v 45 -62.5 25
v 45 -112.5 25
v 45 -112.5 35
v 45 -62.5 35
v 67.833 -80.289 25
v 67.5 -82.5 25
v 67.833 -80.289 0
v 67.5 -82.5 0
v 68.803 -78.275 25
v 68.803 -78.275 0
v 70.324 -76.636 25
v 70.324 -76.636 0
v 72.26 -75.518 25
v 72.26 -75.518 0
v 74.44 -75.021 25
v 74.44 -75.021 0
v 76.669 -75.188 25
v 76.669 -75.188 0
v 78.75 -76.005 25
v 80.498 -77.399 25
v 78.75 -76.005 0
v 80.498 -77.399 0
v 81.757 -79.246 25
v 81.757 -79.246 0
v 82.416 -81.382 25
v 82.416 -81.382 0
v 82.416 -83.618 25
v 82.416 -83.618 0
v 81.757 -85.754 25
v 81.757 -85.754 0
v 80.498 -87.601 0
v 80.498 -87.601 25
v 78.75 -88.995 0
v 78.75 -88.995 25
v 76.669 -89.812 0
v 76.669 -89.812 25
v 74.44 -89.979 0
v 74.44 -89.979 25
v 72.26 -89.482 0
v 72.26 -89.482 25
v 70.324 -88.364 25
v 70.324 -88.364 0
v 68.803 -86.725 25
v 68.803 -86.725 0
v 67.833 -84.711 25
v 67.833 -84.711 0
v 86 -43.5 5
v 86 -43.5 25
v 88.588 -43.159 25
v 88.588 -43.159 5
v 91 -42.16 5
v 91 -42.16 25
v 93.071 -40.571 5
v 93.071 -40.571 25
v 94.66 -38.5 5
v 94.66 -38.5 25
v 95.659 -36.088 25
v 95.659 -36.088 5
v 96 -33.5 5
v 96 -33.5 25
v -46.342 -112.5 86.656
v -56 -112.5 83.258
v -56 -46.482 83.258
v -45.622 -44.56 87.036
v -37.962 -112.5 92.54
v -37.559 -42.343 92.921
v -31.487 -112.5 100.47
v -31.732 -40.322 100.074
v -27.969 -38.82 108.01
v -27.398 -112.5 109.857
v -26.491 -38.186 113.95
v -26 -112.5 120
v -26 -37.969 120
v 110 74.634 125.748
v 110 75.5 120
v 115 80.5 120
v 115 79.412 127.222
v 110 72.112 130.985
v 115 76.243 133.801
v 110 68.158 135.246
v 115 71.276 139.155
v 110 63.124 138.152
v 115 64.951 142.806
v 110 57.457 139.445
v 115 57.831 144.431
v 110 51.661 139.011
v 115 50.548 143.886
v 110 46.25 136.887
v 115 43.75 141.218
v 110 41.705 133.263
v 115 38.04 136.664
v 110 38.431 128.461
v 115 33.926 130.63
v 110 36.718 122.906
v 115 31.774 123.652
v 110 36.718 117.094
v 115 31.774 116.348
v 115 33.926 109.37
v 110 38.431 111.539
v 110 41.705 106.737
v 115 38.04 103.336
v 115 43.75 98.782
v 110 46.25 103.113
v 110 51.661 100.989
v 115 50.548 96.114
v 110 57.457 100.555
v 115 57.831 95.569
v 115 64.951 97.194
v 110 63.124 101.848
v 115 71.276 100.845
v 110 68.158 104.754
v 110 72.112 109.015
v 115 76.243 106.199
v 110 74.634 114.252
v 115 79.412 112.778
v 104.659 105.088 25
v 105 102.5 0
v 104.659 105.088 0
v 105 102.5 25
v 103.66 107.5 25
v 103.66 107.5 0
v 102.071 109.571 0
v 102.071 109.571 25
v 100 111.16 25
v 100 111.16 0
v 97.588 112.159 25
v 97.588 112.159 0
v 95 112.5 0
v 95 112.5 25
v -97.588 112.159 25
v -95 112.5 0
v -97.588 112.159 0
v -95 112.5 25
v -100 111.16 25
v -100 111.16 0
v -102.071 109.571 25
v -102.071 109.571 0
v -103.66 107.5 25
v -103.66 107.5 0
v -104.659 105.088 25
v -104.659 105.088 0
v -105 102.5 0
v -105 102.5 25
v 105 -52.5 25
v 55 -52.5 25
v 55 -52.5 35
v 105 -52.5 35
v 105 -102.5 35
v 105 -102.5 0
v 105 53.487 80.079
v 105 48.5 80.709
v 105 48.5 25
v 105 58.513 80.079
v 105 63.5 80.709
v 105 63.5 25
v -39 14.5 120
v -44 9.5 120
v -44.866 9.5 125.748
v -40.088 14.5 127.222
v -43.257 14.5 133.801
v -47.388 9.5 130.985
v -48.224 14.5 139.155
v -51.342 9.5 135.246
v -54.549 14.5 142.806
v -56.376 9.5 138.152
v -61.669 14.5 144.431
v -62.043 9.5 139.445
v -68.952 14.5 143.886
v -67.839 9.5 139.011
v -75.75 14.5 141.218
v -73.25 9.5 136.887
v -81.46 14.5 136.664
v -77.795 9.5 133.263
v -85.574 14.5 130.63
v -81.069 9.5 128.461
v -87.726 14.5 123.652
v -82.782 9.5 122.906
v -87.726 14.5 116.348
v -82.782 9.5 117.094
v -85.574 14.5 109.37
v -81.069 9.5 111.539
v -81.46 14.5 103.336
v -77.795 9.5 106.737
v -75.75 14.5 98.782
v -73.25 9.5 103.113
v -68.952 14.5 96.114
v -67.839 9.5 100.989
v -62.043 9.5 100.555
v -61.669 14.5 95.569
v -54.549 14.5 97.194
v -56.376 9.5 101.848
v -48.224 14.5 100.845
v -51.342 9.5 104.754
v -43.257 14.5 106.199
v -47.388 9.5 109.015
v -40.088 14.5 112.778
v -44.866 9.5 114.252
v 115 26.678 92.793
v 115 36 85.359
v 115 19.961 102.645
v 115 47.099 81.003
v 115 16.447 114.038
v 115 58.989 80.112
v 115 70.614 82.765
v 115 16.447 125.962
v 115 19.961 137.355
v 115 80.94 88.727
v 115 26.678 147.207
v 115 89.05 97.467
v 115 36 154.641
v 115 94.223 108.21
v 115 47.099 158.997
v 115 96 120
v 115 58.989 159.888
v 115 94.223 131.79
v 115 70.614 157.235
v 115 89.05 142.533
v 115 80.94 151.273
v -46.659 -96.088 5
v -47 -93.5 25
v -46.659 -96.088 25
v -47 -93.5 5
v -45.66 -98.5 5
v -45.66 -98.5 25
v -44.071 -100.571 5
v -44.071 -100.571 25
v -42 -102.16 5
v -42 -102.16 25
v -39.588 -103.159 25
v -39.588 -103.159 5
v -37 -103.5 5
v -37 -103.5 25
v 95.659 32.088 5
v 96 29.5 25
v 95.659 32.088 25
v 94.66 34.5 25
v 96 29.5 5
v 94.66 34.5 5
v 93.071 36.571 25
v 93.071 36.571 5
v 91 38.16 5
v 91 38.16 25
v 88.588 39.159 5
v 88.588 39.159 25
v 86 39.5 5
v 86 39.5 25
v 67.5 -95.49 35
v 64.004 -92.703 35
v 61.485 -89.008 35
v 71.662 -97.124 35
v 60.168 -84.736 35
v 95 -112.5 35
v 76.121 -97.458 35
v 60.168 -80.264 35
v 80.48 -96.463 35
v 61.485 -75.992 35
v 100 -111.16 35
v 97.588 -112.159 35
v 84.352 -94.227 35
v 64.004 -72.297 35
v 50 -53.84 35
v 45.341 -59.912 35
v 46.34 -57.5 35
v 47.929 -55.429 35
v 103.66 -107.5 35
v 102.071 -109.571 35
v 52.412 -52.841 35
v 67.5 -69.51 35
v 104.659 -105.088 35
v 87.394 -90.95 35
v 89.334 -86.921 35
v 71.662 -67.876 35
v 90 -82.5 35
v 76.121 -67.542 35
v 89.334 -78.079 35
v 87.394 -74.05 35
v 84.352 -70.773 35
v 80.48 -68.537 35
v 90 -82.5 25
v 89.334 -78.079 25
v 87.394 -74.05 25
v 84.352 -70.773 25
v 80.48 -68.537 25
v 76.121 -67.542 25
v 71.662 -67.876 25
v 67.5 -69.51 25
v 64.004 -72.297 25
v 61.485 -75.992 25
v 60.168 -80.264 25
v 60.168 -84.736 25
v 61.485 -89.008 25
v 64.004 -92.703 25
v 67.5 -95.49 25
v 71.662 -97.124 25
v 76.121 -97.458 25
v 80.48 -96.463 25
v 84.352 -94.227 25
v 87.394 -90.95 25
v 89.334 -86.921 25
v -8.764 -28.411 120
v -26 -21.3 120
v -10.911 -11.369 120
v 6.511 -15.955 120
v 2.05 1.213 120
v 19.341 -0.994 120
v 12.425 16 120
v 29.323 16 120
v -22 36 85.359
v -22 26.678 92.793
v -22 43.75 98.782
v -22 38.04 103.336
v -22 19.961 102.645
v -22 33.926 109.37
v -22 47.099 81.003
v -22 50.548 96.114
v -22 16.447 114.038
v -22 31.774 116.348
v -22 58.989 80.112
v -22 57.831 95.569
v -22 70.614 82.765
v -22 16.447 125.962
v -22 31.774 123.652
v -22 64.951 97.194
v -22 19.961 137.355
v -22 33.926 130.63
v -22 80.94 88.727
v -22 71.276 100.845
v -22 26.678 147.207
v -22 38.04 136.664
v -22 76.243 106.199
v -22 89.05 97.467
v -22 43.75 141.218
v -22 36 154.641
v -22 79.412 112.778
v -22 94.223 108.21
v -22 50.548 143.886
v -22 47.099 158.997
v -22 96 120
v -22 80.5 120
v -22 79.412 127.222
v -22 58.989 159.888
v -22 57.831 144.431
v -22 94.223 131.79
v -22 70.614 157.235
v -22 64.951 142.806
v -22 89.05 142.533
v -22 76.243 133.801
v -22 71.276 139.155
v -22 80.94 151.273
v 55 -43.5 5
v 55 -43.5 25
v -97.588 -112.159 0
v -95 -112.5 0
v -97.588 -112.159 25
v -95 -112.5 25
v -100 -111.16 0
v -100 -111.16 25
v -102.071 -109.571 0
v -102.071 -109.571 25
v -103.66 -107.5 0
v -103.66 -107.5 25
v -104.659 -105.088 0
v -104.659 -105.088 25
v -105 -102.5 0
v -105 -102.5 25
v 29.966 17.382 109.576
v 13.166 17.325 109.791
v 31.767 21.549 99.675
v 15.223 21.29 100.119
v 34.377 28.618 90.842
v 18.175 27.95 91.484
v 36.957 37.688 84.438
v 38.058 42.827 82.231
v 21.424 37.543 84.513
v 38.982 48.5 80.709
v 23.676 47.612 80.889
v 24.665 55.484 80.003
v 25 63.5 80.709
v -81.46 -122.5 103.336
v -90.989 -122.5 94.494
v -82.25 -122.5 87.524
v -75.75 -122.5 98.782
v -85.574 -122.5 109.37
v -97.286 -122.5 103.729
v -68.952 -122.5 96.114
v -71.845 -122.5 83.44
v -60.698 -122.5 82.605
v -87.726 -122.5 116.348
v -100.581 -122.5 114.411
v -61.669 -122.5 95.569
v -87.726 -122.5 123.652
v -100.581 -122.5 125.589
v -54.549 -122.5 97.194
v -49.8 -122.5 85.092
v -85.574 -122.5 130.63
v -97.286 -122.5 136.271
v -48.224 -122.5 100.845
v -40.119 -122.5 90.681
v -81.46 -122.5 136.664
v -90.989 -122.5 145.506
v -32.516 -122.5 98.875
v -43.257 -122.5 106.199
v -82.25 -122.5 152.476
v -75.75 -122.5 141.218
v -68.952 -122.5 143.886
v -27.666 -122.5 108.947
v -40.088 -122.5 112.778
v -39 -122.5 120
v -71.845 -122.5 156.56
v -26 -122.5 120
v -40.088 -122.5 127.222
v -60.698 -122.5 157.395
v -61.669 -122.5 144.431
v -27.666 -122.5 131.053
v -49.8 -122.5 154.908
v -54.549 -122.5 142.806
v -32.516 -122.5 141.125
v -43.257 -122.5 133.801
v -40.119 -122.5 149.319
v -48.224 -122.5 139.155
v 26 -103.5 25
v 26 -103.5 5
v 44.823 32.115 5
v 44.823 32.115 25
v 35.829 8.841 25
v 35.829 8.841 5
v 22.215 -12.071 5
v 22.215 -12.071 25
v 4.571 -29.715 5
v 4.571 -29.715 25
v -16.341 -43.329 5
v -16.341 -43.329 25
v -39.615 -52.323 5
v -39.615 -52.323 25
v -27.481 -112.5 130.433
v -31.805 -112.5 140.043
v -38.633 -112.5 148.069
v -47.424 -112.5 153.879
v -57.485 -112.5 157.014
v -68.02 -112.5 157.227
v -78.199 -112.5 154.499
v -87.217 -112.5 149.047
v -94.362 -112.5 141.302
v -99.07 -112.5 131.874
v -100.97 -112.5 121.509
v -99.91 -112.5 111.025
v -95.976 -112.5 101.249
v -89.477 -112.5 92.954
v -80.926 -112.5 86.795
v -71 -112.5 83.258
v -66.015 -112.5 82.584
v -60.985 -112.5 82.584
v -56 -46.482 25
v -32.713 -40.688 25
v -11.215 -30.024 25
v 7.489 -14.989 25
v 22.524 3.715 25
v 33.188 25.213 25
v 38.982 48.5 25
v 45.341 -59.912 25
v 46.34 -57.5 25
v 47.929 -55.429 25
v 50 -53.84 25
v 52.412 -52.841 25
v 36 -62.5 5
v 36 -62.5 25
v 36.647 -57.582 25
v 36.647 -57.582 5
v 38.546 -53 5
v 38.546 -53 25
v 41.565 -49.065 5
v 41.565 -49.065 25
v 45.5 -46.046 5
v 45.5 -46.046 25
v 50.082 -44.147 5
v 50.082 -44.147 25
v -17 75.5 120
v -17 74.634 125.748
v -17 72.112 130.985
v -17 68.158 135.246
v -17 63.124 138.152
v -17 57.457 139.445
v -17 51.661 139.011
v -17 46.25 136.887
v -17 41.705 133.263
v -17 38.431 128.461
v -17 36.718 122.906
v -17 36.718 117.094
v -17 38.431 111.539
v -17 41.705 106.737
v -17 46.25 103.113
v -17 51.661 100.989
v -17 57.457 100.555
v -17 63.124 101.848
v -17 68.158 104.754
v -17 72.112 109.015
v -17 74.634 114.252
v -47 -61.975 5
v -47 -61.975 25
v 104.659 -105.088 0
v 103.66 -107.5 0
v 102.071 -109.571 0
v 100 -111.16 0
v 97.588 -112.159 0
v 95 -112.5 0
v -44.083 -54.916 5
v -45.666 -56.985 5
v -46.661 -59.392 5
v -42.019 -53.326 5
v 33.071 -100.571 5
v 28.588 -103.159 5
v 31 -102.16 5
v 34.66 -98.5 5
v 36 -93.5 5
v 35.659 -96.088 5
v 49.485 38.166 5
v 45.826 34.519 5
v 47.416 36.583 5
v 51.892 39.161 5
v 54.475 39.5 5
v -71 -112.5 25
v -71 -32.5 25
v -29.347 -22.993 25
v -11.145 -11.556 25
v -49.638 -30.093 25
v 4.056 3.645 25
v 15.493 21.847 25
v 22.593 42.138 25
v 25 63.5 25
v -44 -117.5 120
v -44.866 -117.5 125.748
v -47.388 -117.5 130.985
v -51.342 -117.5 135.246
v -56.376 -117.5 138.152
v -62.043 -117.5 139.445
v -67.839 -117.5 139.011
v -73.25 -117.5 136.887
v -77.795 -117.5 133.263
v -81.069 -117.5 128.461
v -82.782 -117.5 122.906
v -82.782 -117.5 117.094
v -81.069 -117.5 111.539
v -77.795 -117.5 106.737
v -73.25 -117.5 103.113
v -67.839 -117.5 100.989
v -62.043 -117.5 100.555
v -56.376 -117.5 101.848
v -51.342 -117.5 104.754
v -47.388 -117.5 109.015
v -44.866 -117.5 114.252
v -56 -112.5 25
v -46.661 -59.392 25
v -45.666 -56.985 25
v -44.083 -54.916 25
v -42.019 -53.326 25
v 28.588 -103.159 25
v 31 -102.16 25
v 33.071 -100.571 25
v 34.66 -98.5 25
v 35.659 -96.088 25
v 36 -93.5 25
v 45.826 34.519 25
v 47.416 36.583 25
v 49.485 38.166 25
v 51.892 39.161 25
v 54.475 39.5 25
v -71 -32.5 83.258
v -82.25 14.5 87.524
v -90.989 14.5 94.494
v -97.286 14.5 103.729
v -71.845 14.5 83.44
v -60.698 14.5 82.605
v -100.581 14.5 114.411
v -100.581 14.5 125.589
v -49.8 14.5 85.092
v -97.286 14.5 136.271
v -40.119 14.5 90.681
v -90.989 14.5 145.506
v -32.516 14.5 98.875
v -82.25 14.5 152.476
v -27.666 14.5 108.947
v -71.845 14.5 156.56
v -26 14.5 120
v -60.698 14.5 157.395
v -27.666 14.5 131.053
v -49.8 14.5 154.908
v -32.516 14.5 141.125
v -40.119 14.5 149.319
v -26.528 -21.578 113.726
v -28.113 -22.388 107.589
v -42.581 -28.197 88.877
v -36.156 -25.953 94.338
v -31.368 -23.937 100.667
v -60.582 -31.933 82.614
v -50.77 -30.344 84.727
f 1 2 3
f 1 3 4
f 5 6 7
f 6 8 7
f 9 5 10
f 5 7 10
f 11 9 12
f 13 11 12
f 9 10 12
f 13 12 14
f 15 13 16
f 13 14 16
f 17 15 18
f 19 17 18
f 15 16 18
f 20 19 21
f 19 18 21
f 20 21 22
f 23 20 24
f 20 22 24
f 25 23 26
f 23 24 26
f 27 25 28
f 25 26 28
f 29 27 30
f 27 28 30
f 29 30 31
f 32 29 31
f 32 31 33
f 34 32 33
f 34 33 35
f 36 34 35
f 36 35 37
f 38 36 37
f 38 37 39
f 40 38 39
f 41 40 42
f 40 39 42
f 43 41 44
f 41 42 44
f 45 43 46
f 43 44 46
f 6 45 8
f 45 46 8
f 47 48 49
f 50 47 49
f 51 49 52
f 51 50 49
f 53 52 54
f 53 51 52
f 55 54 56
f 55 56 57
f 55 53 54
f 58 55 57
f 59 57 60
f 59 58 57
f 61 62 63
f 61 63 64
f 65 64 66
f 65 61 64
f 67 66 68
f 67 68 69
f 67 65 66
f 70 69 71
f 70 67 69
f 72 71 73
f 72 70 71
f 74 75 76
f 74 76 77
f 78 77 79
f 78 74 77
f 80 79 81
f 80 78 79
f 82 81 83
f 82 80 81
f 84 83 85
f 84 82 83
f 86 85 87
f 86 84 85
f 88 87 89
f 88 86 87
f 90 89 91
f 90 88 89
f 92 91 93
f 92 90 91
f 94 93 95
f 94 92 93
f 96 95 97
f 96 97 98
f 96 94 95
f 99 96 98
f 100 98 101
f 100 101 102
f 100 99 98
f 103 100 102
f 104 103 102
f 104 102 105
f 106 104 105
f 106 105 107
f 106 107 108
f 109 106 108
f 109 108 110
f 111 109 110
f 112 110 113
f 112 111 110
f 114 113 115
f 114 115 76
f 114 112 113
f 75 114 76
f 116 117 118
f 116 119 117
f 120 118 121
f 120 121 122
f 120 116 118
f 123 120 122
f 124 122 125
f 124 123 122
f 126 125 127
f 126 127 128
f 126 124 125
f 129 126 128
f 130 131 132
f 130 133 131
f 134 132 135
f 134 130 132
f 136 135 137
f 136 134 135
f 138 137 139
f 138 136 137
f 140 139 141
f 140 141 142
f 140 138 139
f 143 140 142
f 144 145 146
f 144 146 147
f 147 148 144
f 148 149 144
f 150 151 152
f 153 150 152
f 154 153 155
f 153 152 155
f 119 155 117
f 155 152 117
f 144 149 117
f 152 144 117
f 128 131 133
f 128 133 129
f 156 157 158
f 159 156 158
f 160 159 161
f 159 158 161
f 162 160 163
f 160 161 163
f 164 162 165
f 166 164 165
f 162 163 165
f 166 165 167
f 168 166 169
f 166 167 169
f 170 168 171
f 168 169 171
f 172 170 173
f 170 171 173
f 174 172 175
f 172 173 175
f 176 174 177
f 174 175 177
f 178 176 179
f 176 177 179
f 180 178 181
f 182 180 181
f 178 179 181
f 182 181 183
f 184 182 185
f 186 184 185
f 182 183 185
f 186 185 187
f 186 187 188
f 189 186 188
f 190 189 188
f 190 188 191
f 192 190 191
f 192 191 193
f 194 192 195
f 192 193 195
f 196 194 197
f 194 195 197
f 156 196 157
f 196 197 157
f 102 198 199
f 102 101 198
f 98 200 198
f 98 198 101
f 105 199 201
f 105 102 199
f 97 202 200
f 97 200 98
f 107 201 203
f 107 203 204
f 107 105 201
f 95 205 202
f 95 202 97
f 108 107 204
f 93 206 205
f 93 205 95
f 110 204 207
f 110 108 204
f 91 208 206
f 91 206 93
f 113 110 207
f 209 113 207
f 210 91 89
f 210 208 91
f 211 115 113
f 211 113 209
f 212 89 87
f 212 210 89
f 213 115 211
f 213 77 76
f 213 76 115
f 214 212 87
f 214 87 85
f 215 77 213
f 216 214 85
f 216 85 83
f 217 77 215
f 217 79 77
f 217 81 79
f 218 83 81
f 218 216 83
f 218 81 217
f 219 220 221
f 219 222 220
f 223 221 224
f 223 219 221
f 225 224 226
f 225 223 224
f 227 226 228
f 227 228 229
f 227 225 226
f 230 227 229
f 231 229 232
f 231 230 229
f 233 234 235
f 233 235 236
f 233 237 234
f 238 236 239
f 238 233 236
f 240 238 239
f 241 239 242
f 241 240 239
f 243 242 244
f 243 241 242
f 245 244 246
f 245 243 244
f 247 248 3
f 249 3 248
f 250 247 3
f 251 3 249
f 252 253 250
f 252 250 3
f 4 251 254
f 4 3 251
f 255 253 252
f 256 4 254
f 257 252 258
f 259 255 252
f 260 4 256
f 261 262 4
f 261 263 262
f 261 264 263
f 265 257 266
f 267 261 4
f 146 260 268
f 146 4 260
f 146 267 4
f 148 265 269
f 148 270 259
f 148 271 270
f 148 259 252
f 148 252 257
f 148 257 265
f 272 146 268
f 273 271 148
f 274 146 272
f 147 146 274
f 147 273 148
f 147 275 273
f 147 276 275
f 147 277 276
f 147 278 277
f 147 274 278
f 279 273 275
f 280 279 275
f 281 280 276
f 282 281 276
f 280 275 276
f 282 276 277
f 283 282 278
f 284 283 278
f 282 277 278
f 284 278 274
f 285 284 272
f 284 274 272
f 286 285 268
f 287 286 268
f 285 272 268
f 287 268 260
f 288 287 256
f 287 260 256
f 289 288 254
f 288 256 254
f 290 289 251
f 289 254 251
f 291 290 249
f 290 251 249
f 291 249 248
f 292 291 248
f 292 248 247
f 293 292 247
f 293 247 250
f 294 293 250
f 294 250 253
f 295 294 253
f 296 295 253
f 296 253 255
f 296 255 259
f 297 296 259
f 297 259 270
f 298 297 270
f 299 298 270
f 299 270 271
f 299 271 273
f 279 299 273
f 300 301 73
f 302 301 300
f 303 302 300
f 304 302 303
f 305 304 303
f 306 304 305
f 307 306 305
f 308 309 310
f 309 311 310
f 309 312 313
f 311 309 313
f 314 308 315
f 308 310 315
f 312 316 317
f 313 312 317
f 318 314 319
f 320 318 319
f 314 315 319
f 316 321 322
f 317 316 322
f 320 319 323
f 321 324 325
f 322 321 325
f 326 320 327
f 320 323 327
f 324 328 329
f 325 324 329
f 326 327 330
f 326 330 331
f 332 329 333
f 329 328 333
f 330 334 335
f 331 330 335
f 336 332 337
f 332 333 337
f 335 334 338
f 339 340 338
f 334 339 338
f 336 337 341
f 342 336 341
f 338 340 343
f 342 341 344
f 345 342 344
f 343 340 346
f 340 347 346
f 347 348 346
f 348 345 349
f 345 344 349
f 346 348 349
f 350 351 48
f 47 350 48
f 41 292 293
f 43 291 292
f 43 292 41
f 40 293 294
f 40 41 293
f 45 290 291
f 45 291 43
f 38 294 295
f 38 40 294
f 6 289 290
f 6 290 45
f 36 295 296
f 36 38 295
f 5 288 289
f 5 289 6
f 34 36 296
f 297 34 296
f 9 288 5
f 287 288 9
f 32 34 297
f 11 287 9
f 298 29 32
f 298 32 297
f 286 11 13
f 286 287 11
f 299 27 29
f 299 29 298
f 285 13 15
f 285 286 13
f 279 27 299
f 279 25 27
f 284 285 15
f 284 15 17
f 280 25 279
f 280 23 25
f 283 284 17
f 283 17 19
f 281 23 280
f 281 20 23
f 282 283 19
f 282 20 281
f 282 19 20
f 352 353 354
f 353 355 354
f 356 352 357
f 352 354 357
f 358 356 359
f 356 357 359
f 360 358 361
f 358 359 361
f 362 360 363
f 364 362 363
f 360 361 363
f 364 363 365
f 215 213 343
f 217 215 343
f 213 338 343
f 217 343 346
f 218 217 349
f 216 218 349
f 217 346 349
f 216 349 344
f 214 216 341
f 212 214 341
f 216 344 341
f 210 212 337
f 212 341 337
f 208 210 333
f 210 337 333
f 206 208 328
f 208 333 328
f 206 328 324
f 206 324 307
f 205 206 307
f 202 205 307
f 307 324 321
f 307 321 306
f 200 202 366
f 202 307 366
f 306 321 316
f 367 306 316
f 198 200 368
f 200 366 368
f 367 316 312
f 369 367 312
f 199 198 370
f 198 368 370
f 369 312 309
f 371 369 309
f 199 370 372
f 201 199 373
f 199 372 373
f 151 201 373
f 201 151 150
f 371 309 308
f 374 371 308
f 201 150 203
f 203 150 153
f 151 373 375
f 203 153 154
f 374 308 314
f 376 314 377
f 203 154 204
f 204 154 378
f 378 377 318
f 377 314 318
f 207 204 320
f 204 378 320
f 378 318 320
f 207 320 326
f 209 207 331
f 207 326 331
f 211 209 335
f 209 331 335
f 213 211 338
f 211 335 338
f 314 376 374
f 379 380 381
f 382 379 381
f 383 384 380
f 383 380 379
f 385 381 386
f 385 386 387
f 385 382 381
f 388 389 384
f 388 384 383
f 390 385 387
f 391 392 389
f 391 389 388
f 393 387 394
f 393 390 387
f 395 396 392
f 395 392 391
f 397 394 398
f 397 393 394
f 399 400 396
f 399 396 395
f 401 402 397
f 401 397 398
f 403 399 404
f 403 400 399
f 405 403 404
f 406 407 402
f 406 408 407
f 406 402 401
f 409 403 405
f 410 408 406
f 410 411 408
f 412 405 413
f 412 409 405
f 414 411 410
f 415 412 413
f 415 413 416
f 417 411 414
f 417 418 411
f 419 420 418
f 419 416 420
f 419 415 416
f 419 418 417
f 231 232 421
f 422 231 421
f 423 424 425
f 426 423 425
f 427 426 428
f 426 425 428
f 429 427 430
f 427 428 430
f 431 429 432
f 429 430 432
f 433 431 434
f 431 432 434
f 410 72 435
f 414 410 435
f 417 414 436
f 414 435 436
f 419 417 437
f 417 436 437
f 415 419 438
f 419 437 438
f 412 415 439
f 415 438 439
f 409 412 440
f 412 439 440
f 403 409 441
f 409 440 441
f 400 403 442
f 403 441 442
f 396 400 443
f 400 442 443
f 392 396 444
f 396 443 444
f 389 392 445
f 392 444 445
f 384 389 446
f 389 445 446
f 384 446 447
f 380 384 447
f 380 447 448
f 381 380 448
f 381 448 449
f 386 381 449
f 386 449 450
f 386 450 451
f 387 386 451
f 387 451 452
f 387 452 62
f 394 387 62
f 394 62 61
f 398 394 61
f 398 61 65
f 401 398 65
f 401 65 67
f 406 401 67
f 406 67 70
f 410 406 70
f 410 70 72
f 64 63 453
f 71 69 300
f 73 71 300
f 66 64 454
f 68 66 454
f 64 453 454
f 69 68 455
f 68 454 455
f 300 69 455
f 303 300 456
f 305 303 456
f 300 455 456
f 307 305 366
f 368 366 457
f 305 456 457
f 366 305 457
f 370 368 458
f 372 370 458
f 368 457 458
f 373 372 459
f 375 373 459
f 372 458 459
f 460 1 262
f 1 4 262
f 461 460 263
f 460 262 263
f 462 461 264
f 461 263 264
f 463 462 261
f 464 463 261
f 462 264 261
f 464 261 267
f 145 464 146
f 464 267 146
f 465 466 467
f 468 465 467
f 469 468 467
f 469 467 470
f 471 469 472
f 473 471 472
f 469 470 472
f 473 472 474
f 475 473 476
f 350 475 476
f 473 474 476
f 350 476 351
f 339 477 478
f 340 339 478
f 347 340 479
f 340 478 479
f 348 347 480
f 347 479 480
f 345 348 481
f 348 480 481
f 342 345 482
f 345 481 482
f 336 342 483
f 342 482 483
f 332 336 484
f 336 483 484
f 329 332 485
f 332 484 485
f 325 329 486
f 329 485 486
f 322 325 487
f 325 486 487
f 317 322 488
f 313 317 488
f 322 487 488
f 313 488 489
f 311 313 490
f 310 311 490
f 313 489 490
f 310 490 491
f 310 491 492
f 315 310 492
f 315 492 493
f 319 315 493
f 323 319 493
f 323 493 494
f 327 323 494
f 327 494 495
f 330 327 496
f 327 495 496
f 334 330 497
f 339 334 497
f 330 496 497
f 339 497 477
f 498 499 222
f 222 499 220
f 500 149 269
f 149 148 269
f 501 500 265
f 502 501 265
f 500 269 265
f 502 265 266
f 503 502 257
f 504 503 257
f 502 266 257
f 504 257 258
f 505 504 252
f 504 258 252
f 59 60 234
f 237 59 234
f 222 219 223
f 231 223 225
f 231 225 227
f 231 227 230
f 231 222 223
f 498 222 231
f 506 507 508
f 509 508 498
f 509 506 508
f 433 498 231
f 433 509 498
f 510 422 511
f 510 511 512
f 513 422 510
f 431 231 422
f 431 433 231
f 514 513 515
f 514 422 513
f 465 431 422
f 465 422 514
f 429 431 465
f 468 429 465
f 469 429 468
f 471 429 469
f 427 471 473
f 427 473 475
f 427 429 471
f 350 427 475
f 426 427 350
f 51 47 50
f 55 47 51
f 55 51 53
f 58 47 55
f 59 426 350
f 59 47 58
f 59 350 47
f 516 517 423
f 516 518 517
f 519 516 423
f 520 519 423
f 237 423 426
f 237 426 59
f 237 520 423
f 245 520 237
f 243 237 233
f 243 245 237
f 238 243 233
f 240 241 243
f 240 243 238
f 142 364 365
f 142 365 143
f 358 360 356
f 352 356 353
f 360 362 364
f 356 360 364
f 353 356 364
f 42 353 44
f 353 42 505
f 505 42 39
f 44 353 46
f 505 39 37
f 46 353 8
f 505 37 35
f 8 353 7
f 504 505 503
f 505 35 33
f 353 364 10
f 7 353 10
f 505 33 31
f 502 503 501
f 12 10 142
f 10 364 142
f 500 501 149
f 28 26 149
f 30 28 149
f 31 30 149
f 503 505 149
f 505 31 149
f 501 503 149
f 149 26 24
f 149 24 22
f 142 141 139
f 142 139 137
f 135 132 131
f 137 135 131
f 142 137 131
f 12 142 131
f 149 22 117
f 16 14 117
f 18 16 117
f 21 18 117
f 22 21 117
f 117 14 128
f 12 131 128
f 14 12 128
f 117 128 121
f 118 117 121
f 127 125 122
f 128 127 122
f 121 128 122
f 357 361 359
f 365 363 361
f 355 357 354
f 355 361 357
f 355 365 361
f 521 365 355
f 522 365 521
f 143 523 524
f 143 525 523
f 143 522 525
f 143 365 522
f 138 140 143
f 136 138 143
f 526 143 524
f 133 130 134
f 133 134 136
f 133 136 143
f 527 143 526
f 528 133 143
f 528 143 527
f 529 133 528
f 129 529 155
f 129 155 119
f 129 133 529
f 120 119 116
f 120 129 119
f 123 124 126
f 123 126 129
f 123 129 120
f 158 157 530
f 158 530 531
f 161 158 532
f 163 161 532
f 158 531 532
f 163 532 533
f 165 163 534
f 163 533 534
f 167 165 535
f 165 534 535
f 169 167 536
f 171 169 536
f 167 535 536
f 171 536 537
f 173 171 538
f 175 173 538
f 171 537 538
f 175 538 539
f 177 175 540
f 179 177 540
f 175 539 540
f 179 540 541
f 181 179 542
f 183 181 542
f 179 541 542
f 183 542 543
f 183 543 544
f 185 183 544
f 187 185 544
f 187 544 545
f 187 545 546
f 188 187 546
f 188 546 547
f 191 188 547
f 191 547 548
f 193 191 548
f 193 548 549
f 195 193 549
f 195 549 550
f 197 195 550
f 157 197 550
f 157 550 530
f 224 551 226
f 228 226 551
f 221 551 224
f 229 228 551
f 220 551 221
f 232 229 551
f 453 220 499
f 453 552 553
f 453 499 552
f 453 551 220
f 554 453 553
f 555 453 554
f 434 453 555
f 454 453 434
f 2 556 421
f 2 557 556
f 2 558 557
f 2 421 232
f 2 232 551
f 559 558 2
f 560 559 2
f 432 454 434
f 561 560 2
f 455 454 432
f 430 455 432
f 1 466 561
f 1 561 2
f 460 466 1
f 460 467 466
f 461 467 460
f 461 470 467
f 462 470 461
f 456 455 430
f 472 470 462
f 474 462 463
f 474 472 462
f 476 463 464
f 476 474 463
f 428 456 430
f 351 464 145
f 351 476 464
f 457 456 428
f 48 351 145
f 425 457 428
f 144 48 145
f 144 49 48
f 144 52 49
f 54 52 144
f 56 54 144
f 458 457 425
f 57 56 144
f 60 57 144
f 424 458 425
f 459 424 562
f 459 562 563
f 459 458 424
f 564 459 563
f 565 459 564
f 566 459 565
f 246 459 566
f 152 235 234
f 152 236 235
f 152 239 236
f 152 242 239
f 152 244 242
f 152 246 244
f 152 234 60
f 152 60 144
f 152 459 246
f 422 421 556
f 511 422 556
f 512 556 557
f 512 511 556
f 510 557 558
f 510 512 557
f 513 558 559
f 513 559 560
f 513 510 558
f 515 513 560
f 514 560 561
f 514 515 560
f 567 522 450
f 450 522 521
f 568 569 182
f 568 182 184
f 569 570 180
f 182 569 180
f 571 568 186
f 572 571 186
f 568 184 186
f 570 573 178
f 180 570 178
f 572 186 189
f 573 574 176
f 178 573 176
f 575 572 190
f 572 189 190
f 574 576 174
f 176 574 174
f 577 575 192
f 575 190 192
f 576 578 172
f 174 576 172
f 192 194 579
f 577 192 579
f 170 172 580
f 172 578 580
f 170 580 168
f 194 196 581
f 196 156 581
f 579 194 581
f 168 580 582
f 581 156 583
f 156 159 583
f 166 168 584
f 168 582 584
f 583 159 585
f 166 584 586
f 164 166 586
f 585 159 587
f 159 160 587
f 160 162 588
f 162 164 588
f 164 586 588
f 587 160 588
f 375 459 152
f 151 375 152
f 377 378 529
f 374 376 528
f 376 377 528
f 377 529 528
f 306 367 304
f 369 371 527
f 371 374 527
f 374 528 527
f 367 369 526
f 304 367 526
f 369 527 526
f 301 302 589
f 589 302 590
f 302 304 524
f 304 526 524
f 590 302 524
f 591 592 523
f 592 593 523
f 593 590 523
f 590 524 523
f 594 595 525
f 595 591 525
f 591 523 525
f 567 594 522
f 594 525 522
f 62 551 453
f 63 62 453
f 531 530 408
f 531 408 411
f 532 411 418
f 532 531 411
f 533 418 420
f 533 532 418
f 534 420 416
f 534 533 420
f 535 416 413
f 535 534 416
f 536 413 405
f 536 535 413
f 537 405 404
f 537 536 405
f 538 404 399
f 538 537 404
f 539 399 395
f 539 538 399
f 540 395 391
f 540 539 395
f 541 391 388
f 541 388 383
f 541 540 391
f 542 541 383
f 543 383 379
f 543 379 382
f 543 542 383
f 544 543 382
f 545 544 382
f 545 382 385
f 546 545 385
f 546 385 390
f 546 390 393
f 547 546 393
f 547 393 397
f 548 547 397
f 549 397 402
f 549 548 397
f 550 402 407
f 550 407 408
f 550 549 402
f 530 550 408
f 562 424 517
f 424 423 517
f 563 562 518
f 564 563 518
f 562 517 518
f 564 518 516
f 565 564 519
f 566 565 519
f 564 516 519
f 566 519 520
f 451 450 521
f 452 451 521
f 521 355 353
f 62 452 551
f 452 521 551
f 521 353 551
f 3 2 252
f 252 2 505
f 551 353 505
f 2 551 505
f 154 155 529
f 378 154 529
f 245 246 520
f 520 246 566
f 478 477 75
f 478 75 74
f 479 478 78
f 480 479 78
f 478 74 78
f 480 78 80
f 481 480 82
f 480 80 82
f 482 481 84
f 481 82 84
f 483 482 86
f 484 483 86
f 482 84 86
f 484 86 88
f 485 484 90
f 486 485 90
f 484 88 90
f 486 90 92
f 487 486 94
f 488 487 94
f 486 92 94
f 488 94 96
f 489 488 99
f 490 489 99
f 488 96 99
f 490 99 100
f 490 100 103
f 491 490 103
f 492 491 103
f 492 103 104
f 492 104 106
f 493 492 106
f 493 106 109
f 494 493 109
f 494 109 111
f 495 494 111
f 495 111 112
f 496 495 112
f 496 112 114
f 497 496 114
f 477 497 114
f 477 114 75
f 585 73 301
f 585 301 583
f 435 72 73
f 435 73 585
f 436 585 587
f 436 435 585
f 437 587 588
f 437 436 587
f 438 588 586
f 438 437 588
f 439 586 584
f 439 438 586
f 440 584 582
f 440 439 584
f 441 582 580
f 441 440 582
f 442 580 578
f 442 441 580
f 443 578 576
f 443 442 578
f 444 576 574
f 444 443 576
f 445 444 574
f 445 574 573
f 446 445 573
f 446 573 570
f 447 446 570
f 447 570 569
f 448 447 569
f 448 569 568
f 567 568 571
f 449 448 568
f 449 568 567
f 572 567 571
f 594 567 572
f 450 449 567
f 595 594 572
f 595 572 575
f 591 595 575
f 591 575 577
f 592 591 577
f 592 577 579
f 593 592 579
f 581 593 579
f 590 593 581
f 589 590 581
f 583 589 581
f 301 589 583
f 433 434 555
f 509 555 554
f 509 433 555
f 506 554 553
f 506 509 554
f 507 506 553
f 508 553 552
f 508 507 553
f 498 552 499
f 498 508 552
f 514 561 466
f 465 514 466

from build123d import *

# Parameters (mm, degrees)
F0_W            = 210
F0_H            = 225
F1_DEPTH        = 25
F3_DEPTH        = 95
F4_R            = 37.5
F5_DEPTH        = 10
F5_DEPTH_BACK   = 127
F6_R            = 40
F7_DEPTH        = 10
F7_DEPTH_BACK   = 127
F8_W            = 60
F8_H            = 60
F9_DEPTH        = 10
F10_R           = 10
F12_DEPTH       = 20
F14_D           = 15
F14_CBORE_D     = 30
F14_CBORE_DEPTH = 10
F15_R           = 10
F16_R           = 19.5
F17_DEPTH       = 235.001
F18_R           = 19.5
F19_DEPTH       = 220.001
F20_SIZE        = 5
F21_R           = 10


with BuildPart() as f1:
    # F0 (on Top) → F1 (new body)
    with BuildSketch(Plane.XY):
        Rectangle(F0_W, F0_H)
    extrude(amount=F1_DEPTH)

    # F2 (on face) → F3 (join)
    with BuildSketch(Plane.XY.offset(25)):
        with BuildLine():
            Line((-71, -32.5), (-71, -112.5))
            Line((-71, -112.5), (-56, -112.5))
            Line((-56, -112.5), (-56, -46.481817))
            ThreePointArc((-56, -46.481817), (7.488853, -14.988853), (38.981817, 48.5))
            Line((38.981817, 48.5), (105, 48.5))
            Line((105, 48.5), (105, 63.5))
            Line((105, 63.5), (25, 63.5))
            ThreePointArc((25, 63.5), (-3.117749, -4.382251), (-71, -32.5))
        make_face()
    extrude(amount=F3_DEPTH)

    # F4 (on face) → F5 (join, two sides)
    with BuildSketch(Plane.XZ.offset(112.5)) as f5_sk:
        with Locations((-63.5, 120)):
            Circle(F4_R)
    extrude(amount=F5_DEPTH)
    extrude(f5_sk.sketch, amount=-F5_DEPTH_BACK)

    # F6 (on face) → F7 (join, two sides)
    with BuildSketch(Plane.YZ.offset(105)) as f7_sk:
        with Locations((56, 120)):
            Circle(F6_R)
    extrude(amount=F7_DEPTH)
    extrude(f7_sk.sketch, amount=-F7_DEPTH_BACK)

    # F8 (on face) → F9 (join)
    with BuildSketch(Plane.XY.offset(25)):
        with Locations((75, -82.5)):
            Rectangle(F8_W, F8_H)
    extrude(amount=F9_DEPTH)

    # F10
    f10_edges = [f1.edges().sort_by_distance(p)[0] for p in [
        (45, -52.5, 30),
    ]]
    fillet(f10_edges, radius=F10_R)

    # F11 (on face) → F12 (cut)
    with BuildSketch(Plane.XY.offset(25)):
        with BuildLine():
            ThreePointArc((46.575508, 39.5), (13.852814, -21.352814), (-47, -54.075508))
            Line((-47, -54.075508), (-47, -103.5))
            Line((-47, -103.5), (36, -103.5))
            Line((36, -103.5), (36, -62.5))
            ThreePointArc((36, -62.5), (41.564971, -49.064971), (55, -43.5))
            Line((55, -43.5), (96, -43.5))
            Line((96, -43.5), (96, 39.5))
            Line((96, 39.5), (46.575508, 39.5))
        make_face()
    extrude(amount=-F12_DEPTH, mode=Mode.SUBTRACT)

    # F14 (through all)
    with Locations(Plane.XY.offset(35)):
        with Locations((75, -82.5)):
            CounterBoreHole(F14_D / 2, F14_CBORE_D / 2, F14_CBORE_DEPTH)

    # F15
    f15_edges = [f1.edges().sort_by_distance(p)[0] for p in [
        (-47, -54.075508, 15),
        (46.575508, 39.5, 15),
        (96, 39.5, 15),
        (96, -43.5, 15),
        (36, -103.5, 15),
        (-47, -103.5, 15),
    ]]
    fillet(f15_edges, radius=F15_R)

    # F16 (on face) → F17 (cut, through all)
    with BuildSketch(Plane.XZ.offset(122.5)):
        with Locations((-63.5, 120)):
            Circle(F16_R)
    extrude(amount=-F17_DEPTH, mode=Mode.SUBTRACT)

    # F18 (on face) → F19 (cut, through all)
    with BuildSketch(Plane.YZ.offset(115)):
        with Locations((56, 120)):
            Circle(F18_R)
    extrude(amount=-F19_DEPTH, mode=Mode.SUBTRACT)

    # F20
    f20_edges = [f1.edges().sort_by_distance(p)[0] for p in [
        (115, 36.5, 120),
        (-22, 36.5, 120),
        (-83, 14.5, 120),
        (-83, -122.5, 120),
    ]]
    chamfer(f20_edges, length=F20_SIZE)

    # F21
    f21_edges = [f1.edges().sort_by_distance(p)[0] for p in [
        (-105, -112.5, 12.5),
        (105, -112.5, 17.5),
        (105, 112.5, 12.5),
        (-105, 112.5, 12.5),
    ]]
    fillet(f21_edges, radius=F21_R)


solid = f1.part
